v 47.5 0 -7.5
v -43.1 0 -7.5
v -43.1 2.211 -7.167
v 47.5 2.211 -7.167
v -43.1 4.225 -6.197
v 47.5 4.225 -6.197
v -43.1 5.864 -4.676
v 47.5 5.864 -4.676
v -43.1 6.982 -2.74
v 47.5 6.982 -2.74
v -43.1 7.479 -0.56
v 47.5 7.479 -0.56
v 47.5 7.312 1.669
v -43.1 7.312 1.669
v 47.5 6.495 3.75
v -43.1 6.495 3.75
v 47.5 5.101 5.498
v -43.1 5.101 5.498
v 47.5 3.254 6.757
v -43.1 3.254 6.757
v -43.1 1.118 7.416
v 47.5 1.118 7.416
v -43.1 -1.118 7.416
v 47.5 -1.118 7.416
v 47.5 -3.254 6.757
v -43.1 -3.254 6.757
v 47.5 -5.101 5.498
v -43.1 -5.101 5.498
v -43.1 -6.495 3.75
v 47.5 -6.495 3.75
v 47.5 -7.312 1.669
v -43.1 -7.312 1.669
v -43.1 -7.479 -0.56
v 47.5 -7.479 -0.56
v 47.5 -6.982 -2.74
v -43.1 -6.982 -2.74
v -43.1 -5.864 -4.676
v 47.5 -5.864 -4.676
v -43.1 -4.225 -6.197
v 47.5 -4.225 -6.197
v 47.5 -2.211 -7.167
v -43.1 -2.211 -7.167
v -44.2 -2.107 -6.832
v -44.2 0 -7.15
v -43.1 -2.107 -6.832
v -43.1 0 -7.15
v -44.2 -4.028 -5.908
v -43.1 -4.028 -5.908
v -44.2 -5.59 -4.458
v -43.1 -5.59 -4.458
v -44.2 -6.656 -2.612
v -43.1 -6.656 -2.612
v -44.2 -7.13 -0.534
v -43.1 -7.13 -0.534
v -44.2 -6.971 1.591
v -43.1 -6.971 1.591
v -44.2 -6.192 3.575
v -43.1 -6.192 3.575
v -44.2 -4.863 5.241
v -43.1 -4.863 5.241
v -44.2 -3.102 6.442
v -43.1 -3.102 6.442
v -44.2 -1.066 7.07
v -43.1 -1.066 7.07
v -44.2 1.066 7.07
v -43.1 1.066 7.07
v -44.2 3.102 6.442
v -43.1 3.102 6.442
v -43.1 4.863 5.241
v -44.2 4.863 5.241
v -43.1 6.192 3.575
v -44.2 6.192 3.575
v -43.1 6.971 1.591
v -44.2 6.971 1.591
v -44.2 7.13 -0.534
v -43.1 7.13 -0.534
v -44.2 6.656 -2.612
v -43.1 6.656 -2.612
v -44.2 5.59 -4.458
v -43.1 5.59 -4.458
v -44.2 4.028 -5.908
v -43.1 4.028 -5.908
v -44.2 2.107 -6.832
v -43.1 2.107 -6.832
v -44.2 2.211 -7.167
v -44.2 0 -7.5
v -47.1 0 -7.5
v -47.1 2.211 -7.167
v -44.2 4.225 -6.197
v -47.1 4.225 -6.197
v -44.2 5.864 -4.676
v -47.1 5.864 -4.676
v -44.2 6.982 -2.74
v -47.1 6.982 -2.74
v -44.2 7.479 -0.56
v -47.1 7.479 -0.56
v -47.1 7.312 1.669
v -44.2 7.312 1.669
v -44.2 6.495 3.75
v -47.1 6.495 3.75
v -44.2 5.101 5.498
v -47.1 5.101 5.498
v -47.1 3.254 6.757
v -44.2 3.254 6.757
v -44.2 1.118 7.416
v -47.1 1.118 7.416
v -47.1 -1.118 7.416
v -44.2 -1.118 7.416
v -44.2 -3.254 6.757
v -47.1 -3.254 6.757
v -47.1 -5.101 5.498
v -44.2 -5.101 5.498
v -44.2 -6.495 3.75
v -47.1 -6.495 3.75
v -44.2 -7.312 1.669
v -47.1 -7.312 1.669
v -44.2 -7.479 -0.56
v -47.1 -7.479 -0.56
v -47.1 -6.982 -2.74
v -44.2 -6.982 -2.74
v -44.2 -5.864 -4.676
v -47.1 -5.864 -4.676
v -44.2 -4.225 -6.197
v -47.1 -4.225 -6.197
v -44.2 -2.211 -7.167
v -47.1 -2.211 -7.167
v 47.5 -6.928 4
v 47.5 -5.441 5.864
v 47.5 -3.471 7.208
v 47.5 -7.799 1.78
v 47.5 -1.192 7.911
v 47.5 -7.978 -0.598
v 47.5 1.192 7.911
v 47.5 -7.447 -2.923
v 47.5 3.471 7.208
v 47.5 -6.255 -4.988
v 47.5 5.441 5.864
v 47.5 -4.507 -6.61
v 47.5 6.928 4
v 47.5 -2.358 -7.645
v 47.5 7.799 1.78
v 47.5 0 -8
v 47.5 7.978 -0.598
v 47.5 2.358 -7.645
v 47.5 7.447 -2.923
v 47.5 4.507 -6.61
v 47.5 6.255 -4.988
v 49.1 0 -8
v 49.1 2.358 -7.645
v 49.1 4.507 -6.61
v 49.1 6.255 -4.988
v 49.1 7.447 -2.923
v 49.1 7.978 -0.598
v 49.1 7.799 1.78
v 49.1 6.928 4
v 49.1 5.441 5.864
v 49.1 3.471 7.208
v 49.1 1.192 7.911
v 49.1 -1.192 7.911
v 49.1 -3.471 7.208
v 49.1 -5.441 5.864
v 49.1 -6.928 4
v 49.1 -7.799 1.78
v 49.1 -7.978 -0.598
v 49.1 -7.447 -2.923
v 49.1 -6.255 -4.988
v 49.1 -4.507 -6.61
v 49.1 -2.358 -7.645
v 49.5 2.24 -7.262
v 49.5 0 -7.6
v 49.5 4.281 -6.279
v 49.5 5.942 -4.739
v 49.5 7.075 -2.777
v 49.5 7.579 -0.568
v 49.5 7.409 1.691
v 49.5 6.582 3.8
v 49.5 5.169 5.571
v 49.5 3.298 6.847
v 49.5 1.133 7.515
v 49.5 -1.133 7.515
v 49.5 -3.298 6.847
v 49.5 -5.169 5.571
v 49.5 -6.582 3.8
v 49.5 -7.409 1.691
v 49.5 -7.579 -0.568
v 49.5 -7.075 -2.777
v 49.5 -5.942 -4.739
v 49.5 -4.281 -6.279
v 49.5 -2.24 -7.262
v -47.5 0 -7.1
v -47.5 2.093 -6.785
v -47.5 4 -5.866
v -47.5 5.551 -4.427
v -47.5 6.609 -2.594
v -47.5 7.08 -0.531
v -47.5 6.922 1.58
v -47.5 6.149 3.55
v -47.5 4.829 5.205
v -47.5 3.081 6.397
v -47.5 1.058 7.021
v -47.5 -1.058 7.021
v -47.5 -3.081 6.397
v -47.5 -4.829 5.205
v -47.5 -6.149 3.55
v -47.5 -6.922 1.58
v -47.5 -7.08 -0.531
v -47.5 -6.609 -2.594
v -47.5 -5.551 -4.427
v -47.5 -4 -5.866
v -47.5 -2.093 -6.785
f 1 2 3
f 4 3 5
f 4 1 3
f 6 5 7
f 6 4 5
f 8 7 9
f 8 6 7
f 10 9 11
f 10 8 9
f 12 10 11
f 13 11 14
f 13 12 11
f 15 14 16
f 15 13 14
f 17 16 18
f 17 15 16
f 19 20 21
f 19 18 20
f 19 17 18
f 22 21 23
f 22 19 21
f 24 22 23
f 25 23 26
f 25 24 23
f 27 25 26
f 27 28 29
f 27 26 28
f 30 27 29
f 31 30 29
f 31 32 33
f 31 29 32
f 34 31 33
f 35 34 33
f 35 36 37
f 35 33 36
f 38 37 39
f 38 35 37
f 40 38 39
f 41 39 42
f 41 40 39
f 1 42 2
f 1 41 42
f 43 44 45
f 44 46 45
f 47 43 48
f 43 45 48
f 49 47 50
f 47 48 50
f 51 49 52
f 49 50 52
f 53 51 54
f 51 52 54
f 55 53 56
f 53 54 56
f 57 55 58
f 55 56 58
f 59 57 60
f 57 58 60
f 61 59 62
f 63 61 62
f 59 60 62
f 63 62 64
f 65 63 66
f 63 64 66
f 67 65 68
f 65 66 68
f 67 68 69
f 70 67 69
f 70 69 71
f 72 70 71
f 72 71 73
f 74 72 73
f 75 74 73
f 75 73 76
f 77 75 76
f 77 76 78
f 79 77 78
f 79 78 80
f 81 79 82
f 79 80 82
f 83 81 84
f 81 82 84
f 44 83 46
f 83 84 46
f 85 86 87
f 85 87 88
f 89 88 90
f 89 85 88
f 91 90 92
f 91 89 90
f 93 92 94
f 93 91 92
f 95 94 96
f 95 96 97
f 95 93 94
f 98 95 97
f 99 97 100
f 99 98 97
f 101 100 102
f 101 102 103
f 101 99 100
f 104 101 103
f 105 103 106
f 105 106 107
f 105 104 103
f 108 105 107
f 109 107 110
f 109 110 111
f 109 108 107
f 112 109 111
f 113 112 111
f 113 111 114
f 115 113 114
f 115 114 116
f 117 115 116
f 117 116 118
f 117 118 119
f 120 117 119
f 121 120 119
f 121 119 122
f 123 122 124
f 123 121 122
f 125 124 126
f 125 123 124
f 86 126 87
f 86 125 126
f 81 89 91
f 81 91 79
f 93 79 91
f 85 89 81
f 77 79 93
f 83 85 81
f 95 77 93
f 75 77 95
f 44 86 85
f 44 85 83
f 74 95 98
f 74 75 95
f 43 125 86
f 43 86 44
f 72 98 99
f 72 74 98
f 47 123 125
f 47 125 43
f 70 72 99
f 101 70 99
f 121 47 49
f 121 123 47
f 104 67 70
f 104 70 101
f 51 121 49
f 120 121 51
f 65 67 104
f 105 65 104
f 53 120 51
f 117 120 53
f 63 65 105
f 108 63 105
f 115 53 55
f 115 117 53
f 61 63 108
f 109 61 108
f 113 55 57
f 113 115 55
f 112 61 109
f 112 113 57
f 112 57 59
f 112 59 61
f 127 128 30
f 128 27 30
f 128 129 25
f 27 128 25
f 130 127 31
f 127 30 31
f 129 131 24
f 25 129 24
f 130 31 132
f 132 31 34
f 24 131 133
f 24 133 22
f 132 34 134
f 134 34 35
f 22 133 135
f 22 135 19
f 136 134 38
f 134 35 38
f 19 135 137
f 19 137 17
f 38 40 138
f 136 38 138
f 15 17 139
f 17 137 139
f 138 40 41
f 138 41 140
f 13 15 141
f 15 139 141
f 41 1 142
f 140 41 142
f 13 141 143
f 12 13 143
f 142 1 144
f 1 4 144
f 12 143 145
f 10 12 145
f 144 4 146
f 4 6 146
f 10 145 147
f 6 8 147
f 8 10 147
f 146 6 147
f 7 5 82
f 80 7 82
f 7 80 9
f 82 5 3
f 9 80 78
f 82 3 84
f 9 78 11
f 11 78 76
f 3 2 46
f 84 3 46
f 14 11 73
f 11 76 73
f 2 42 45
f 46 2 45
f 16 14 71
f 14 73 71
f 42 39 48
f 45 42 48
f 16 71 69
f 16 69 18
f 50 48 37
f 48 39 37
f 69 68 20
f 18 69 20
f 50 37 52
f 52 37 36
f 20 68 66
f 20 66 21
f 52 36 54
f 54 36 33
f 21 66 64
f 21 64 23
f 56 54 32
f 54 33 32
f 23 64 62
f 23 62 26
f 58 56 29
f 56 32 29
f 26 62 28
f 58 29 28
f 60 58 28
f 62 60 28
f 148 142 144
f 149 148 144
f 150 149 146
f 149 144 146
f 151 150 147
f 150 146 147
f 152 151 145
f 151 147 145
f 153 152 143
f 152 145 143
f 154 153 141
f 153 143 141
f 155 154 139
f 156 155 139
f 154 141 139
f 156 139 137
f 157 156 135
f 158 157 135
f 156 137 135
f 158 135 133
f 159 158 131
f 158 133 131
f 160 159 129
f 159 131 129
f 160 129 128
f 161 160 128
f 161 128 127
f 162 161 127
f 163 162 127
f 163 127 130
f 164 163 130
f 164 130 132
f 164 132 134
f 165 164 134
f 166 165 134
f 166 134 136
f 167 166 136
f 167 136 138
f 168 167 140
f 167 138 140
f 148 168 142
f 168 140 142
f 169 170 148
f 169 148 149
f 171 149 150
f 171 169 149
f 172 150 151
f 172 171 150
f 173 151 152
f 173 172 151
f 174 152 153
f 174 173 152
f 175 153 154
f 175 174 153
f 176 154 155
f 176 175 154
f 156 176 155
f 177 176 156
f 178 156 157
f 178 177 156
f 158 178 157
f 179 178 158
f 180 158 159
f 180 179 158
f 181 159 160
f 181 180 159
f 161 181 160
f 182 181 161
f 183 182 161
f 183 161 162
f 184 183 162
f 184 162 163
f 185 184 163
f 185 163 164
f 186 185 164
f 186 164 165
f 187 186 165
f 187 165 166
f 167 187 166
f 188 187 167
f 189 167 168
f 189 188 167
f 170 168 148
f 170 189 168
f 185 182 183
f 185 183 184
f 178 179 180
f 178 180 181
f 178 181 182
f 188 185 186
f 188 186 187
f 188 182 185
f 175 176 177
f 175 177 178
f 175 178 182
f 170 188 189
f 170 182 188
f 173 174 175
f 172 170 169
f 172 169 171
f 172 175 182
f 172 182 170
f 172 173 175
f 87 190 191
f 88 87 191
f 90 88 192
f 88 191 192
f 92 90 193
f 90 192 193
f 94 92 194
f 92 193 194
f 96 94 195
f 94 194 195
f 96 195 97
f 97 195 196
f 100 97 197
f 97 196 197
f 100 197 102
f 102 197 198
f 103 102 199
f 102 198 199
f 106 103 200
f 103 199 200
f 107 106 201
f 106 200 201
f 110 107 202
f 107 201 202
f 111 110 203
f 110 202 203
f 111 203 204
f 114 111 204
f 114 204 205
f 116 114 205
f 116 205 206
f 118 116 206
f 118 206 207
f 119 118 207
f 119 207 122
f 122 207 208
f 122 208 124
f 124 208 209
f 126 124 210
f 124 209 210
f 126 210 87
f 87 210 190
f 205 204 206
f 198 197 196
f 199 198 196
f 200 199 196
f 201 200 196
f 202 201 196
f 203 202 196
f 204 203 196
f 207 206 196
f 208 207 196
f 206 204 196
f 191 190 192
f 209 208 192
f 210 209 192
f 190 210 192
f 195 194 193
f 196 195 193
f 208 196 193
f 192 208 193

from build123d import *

# Parameters (mm, degrees)
SKETCH1_R           = 7.5
BOSS_EXTRUDE1_DEPTH = 47.5
SKETCH2_R           = 8
BOSS_EXTRUDE2_DEPTH = 2
SKETCH3_W           = 1.1
SKETCH3_H           = 0.35
CHAMFER1_SIZE       = 0.4


with BuildPart() as part:
    # Sketch1 → Boss-Extrude1 (new, symmetric)
    with BuildSketch(Plane(origin=(0, 0, 0), x_dir=(0, 0, -1), z_dir=(1, 0, 0))):
        Circle(SKETCH1_R)
    extrude(amount=BOSS_EXTRUDE1_DEPTH, both=True)

    # Sketch2 → Boss-Extrude2 (add)
    with BuildSketch(Plane(origin=(47.5, 0, 0), x_dir=(0, 0, -1), z_dir=(1, 0, 0))):
        Circle(SKETCH2_R)
    extrude(amount=BOSS_EXTRUDE2_DEPTH)

    # Sketch3 → Cut-Revolve1 (revolve, cut)
    with BuildSketch(Plane(origin=(0, 0, 0), x_dir=(1, 0, 0), z_dir=(0, 1, 0))):
        with Locations((-43.65, 7.325)):
            Rectangle(SKETCH3_W, SKETCH3_H)
    revolve(axis=Axis((0, 0, 0), (-1, 0, 0)), mode=Mode.SUBTRACT)

    # Chamfer1
    chamfer1_edges = [part.edges().sort_by_distance(p)[0] for p in [
        (-47.5, 0, 7.5),
        (49.5, 0, 8),
    ]]
    chamfer(chamfer1_edges, length=CHAMFER1_SIZE)


solid = part.part
